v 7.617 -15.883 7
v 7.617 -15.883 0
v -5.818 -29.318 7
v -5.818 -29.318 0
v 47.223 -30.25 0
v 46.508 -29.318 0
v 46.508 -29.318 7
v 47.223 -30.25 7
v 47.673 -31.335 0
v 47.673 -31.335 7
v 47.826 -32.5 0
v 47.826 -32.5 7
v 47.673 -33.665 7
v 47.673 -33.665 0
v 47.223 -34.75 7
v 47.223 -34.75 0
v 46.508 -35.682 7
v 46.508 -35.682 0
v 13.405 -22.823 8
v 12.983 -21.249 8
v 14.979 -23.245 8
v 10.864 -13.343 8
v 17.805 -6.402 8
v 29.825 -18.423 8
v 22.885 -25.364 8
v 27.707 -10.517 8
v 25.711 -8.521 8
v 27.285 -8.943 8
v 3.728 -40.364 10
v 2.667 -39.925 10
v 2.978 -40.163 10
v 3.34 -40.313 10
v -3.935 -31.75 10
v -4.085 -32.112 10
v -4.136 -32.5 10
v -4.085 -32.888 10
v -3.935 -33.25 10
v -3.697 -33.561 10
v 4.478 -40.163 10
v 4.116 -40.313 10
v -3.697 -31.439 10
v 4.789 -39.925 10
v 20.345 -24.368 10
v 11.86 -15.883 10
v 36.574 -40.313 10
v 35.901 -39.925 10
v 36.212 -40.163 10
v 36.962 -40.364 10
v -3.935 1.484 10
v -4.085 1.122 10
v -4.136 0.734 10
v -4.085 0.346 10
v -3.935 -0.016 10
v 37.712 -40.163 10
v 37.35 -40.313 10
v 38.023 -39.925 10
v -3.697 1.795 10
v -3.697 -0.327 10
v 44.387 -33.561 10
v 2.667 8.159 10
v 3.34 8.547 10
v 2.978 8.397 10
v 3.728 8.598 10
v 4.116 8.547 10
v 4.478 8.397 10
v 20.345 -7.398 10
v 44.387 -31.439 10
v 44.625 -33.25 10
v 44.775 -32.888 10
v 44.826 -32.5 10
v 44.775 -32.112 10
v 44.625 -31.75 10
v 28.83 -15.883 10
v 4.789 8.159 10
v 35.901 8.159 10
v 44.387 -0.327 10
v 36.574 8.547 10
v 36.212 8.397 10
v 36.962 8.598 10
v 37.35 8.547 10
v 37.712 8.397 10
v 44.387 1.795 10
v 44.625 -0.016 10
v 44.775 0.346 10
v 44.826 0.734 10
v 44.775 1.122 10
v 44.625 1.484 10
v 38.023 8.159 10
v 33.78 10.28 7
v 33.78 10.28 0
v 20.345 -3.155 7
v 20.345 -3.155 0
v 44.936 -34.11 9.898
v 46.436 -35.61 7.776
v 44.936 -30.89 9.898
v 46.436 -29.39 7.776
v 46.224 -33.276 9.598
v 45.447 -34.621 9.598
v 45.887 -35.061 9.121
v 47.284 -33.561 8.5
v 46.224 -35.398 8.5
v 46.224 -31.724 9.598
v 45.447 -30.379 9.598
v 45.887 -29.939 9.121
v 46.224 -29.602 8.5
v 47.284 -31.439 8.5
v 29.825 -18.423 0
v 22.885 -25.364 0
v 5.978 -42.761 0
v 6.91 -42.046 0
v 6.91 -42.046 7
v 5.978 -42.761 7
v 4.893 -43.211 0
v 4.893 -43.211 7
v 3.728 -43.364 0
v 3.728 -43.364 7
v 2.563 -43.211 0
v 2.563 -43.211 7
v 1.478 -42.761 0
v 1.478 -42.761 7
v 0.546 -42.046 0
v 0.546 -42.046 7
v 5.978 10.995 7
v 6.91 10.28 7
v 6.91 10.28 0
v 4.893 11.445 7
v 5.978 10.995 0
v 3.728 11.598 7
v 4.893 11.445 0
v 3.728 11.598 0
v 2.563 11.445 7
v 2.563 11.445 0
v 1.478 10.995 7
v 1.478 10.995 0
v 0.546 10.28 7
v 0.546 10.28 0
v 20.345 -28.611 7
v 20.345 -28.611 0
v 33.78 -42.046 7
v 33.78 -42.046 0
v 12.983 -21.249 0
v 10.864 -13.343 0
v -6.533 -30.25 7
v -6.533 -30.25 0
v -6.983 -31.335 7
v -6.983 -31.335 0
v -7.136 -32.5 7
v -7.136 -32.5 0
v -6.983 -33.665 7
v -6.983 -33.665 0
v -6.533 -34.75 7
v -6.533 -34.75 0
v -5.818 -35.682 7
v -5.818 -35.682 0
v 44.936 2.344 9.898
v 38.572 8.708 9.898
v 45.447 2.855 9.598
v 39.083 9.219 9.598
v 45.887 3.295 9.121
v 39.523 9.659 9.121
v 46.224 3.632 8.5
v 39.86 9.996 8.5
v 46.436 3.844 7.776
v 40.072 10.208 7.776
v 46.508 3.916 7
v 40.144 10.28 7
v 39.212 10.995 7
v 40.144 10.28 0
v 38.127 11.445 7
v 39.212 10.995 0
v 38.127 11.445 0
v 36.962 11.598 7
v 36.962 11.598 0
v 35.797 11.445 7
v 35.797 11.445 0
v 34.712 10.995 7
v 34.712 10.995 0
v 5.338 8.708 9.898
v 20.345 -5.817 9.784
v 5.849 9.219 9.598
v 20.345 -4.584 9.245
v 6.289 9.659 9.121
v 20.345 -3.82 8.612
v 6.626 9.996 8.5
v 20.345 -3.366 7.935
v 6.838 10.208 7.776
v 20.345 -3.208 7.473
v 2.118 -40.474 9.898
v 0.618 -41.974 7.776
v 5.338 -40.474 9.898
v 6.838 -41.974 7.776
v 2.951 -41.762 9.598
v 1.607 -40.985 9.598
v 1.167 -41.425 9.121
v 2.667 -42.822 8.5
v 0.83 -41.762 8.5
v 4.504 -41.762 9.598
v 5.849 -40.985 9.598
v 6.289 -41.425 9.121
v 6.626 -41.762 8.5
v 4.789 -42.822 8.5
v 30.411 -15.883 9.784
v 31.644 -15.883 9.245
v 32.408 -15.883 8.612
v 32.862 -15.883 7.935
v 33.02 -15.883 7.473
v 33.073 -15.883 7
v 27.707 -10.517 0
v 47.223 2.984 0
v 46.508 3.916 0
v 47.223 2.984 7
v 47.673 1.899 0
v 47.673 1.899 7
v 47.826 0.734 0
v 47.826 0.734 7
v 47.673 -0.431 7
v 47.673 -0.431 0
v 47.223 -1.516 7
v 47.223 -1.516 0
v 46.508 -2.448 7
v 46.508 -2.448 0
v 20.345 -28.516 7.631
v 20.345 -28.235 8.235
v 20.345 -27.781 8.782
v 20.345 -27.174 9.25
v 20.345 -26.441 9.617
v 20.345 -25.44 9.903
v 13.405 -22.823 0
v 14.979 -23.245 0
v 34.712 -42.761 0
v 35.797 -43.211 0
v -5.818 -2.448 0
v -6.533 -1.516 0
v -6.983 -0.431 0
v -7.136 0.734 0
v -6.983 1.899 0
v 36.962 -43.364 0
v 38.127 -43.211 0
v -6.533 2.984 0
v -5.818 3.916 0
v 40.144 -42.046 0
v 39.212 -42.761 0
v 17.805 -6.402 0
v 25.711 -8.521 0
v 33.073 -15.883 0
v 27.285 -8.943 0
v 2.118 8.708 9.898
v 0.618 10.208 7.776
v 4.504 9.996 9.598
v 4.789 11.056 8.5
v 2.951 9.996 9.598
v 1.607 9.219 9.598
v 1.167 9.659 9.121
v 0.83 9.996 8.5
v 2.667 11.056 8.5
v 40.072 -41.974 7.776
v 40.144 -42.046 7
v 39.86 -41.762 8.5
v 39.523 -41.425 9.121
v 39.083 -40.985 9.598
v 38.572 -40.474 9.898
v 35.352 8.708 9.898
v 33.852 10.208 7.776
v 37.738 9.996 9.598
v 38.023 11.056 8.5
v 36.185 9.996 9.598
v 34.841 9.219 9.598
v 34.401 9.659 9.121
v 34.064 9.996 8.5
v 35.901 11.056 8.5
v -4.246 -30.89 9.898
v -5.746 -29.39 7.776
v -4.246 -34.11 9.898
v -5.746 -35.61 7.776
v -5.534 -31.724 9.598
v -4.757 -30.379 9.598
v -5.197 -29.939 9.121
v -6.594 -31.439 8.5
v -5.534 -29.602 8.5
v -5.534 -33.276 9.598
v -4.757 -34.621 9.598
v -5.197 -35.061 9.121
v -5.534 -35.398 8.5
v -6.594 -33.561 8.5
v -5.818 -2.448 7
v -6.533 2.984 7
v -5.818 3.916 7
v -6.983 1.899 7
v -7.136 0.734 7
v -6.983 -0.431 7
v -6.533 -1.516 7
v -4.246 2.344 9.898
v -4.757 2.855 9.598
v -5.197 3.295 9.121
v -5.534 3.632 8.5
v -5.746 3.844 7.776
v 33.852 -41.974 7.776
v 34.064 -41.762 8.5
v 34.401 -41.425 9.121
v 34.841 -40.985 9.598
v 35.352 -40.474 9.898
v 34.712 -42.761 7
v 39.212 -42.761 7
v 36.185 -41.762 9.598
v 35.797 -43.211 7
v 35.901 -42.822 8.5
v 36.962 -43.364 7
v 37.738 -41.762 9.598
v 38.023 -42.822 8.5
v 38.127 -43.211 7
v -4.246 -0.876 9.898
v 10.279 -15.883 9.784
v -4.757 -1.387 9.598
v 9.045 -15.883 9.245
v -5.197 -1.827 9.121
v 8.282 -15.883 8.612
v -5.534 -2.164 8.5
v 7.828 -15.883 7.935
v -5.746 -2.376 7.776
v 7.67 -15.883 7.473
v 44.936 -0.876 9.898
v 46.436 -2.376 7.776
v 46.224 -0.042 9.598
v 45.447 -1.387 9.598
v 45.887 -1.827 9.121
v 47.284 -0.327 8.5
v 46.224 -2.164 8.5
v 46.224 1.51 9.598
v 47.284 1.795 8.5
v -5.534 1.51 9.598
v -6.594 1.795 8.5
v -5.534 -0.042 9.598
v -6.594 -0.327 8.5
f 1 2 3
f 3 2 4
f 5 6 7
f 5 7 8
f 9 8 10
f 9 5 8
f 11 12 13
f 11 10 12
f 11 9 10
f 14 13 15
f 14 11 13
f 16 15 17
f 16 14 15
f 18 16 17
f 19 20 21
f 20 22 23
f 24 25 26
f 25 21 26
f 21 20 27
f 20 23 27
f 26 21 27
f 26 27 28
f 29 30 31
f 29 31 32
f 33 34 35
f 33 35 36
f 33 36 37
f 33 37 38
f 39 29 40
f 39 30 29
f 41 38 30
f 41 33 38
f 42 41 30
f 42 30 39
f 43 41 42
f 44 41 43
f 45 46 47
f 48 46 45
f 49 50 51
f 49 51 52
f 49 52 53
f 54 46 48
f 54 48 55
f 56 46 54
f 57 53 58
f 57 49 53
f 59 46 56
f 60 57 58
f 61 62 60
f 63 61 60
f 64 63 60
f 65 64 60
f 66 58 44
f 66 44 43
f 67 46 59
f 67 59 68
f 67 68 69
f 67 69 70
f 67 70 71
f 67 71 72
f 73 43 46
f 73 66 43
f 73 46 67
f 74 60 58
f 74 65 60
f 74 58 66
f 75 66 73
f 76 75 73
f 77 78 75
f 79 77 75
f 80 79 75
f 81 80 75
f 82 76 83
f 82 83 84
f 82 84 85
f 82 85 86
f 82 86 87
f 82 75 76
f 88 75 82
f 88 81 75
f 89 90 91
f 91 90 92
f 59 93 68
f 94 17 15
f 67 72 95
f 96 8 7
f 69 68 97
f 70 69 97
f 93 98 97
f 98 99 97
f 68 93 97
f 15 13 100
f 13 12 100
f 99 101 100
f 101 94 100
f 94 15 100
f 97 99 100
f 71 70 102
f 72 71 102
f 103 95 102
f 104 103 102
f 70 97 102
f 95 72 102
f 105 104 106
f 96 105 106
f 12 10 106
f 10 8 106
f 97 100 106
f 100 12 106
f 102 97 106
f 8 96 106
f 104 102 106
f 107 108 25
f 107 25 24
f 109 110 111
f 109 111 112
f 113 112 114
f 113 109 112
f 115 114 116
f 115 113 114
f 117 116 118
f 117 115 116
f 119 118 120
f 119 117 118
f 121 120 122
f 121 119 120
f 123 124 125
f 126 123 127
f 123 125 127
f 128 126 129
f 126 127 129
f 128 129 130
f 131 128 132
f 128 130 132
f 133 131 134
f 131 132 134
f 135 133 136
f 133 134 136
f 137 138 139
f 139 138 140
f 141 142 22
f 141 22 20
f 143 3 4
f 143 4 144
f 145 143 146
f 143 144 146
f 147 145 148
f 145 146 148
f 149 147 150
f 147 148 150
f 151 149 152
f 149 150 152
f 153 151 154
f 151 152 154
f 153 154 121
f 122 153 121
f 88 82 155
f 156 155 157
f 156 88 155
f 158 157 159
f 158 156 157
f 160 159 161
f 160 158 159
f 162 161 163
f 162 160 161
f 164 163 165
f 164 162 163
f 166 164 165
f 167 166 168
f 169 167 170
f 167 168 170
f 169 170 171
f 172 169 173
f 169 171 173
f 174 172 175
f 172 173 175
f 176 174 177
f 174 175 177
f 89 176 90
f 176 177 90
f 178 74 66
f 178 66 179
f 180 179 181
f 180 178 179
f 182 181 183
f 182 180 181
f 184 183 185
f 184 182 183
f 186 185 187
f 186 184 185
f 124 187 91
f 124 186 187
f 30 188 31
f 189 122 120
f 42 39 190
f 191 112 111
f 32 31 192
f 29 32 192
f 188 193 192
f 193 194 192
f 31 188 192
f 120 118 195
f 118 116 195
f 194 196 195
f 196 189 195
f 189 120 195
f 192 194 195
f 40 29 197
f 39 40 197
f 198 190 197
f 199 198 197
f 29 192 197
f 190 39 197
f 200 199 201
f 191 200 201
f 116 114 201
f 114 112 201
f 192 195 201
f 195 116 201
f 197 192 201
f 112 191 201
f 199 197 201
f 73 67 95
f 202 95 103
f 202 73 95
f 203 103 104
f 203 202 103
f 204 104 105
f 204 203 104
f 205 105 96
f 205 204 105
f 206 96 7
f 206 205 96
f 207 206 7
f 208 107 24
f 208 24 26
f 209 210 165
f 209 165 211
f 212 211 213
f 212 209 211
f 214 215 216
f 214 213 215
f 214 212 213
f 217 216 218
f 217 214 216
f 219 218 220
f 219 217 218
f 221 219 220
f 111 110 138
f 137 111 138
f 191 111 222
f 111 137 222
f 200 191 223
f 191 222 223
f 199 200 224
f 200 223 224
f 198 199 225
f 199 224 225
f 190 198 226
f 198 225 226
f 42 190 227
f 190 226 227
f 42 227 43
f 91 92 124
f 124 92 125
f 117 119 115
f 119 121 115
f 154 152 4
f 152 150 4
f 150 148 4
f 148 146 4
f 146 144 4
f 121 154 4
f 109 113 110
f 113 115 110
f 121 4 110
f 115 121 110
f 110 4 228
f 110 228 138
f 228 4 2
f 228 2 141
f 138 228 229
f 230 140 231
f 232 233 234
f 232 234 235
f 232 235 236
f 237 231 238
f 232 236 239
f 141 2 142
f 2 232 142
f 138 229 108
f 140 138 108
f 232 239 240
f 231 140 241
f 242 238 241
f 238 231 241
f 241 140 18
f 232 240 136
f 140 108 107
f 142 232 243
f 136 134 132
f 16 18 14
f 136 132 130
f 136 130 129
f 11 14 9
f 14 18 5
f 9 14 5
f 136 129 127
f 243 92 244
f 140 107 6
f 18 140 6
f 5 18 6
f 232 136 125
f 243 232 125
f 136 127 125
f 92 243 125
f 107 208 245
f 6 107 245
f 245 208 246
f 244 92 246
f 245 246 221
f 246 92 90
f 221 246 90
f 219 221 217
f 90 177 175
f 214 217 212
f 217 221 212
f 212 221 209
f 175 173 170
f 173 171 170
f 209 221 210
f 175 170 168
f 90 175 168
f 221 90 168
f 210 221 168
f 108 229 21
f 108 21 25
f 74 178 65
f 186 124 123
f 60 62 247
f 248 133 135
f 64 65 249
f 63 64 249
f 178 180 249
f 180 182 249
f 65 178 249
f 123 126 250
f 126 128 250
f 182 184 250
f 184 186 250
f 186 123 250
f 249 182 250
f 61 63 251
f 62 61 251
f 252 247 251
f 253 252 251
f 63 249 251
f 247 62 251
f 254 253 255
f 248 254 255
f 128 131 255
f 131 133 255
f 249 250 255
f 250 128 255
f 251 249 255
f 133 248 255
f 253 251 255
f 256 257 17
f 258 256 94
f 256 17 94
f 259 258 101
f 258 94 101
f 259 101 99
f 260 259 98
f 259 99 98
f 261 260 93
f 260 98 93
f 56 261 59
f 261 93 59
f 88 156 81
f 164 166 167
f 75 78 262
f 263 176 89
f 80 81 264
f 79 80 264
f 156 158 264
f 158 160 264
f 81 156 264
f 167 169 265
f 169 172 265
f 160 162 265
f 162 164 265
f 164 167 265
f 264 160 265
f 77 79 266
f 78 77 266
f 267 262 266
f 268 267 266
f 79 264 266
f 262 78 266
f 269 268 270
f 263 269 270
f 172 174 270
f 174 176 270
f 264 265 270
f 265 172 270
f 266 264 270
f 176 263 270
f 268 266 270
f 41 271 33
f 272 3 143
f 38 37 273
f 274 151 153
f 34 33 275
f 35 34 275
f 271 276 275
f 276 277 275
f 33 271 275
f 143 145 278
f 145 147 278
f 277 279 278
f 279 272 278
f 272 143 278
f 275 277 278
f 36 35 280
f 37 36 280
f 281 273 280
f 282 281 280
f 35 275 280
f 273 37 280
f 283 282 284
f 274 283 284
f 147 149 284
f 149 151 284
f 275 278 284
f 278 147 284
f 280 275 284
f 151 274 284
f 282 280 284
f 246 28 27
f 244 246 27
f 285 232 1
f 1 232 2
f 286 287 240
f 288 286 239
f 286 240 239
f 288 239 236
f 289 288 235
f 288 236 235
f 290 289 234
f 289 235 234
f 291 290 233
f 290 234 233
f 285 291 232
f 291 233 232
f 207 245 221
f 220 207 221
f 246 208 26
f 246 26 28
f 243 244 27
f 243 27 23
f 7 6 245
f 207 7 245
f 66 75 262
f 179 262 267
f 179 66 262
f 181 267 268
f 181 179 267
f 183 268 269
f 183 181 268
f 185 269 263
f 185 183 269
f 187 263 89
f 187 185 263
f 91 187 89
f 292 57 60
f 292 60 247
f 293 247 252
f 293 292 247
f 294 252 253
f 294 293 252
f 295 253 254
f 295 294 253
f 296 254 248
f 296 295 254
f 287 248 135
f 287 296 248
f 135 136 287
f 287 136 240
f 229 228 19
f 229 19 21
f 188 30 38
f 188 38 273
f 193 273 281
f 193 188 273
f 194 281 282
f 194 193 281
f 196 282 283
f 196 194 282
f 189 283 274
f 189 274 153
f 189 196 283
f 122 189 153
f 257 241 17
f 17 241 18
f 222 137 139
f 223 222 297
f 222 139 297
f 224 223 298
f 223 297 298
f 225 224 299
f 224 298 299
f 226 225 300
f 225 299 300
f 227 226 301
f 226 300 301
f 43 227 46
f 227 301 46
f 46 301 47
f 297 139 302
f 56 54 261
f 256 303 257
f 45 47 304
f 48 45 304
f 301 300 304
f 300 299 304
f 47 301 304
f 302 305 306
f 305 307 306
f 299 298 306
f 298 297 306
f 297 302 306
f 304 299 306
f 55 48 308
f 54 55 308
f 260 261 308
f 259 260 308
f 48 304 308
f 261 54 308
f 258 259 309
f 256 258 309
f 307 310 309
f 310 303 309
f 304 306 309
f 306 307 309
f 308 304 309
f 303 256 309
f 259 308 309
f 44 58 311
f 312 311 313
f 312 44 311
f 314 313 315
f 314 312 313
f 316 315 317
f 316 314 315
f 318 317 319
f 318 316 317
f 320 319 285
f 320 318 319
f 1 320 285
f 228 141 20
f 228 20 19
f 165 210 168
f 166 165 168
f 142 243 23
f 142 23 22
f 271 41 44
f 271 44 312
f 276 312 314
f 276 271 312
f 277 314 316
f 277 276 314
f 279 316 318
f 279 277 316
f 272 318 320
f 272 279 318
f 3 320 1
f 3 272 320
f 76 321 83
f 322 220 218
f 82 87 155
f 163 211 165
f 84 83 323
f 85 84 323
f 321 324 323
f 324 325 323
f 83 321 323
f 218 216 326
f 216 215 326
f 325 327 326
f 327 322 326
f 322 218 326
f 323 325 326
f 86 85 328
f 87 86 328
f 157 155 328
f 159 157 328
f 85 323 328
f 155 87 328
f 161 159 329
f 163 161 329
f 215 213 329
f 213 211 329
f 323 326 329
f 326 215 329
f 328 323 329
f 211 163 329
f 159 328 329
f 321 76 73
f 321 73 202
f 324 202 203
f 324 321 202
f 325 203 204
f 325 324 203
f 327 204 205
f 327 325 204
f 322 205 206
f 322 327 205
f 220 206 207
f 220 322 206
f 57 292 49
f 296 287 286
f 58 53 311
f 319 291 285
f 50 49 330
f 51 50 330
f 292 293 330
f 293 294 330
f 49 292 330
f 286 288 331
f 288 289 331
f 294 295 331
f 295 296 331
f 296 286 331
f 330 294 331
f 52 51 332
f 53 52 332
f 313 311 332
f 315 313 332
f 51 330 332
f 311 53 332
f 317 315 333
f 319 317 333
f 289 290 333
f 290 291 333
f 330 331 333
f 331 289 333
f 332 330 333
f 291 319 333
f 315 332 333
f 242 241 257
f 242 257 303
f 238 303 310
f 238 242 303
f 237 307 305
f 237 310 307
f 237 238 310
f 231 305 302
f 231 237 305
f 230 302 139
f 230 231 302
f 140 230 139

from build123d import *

# Parameters (mm, degrees)
F1_DEPTH     = 10
F2_DEPTH     = 8
F3_R         = 3
F4_T1_DEPTH  = 21.25
F4_T4_ANGLE  = 90
F4_T6_ANGLE  = 90
F4_T8_ANGLE  = 90
F4_T10_ANGLE = 90
F4_T12_ANGLE = 90
F4_T14_ANGLE = 90
F4_T16_ANGLE = 90
F4_T18_ANGLE = 90


# Not quite as in the source:
# - a fillet or chamfer that OpenCascade refuses, or shapes differently, is made with other operations: its cross-section is extruded or revolved along the edge and cut away or added


with BuildPart() as f1:
    # F0 (on Top) → F1 (new body)
    with BuildSketch(Plane.XY):
        Polygon((25.7107810123, -8.5209181738), (27.2851523571, -8.9427697042), (27.7070038876, -10.5171410491), (33.0728534806, -15.8829906421), (49.6898628385, 0.7340187158), (36.9619407771, 13.4619407771), (20.3449314192, -3.1550685808), align=None)
        Polygon((33.0728534806, -15.8829906421), (27.7070038876, -10.5171410491), (29.8254495283, -18.4232878133), (22.8852285904, -25.3635087511), (14.9790818262, -23.2450631104), (20.3449314192, -28.6109127035), align=None)
        Polygon((17.8046342481, -6.4024725331), (25.7107810123, -8.5209181738), (20.3449314192, -3.1550685808), (7.6170093579, -15.8829906421), (12.9828589509, -21.2488402351), (10.8644133102, -13.342693471), align=None)
        Polygon((49.6898628385, -32.5), (33.0728534806, -15.8829906421), (20.3449314192, -28.6109127035), (36.9619407771, -45.2279220614), align=None)
        Polygon((7.6170093579, -15.8829906421), (20.3449314192, -3.1550685808), (3.7279220614, 13.4619407771), (-9, 0.7340187158), align=None)
        Polygon((3.7279220614, -45.2279220614), (20.3449314192, -28.6109127035), (14.9790818262, -23.2450631104), (13.4047104814, -22.82321158), (12.9828589509, -21.2488402351), (7.6170093579, -15.8829906421), (-9, -32.5), align=None)
        Polygon((29.8254495283, -18.4232878133), (27.7070038876, -10.5171410491), (25.7107810123, -8.5209181738), (17.8046342481, -6.4024725331), (10.8644133102, -13.342693471), (12.9828589509, -21.2488402351), (14.9790818262, -23.2450631104), (22.8852285904, -25.3635087511), align=None)
        Polygon((27.7070038876, -10.5171410491), (27.2851523571, -8.9427697042), (25.7107810123, -8.5209181738), align=None)
        Polygon((13.4047104814, -22.82321158), (14.9790818262, -23.2450631104), (12.9828589509, -21.2488402351), align=None)
    extrude(amount=F1_DEPTH)

    # F0 (on Top) → F2 (cut)
    with BuildSketch(Plane.XY):
        Polygon((29.8254495283, -18.4232878133), (27.7070038876, -10.5171410491), (25.7107810123, -8.5209181738), (17.8046342481, -6.4024725331), (10.8644133102, -13.342693471), (12.9828589509, -21.2488402351), (14.9790818262, -23.2450631104), (22.8852285904, -25.3635087511), align=None)
        Polygon((13.4047104814, -22.82321158), (14.9790818262, -23.2450631104), (12.9828589509, -21.2488402351), align=None)
        Polygon((27.7070038876, -10.5171410491), (27.2851523571, -8.9427697042), (25.7107810123, -8.5209181738), align=None)
    extrude(amount=F2_DEPTH, mode=Mode.SUBTRACT)

    # F3
    f3_edges = [f1.edges().sort_by_distance(p)[0] for p in [
        (43.325902, 7.09798, 10),
        (28.653436, 5.153436, 10),
        (12.036427, 5.153436, 10),
        (-2.636039, 7.09798, 10),
        (-0.691495, -7.574486, 10),
        (-0.691495, -24.191495, 10),
        (-2.636039, -38.863961, 10),
        (12.036427, -36.919417, 10),
        (28.653436, -36.919417, 10),
        (43.325902, -38.863961, 10),
        (41.381358, -24.191495, 10),
        (41.381358, -7.574486, 10),
    ]]
    fillet(f3_edges, radius=F3_R)

    # F4: fillet of radius 4.5 on 8 edges, made by hand

    # F4_s2 → F4_t1 (cut)
    with BuildSketch(Plane.XY.offset(-11.25)):
        with BuildLine():
            ThreePointArc((40.1439212925, 10.2799602618), (36.9619407771, 11.5979797464), (33.7799602618, 10.2799602618))
            Line((33.7799602618, 10.2799602618), (36.9619407771, 13.4619407771))
            Line((36.9619407771, 13.4619407771), (40.1439212925, 10.2799602618))
        make_face()
        with BuildLine():
            ThreePointArc((46.5078823231, 3.9159992311), (47.8259018078, 0.7340187158), (46.5078823231, -2.4479617996))
            Line((46.5078823231, -2.4479617996), (49.6898628385, 0.7340187158))
            Line((49.6898628385, 0.7340187158), (46.5078823231, 3.9159992311))
        make_face()
        with BuildLine():
            ThreePointArc((46.5078823231, -29.3180194847), (47.8259018078, -32.5), (46.5078823231, -35.6819805153))
            Line((46.5078823231, -35.6819805153), (49.6898628385, -32.5))
            Line((49.6898628385, -32.5), (46.5078823231, -29.3180194847))
        make_face()
        with BuildLine():
            ThreePointArc((40.1439212925, -42.045941546), (36.9619407771, -43.3639610307), (33.7799602618, -42.045941546))
            Line((33.7799602618, -42.045941546), (36.9619407771, -45.2279220614))
            Line((36.9619407771, -45.2279220614), (40.1439212925, -42.045941546))
        make_face()
        with BuildLine():
            ThreePointArc((6.9099025767, -42.045941546), (3.7279220614, -43.3639610307), (0.545941546, -42.045941546))
            Line((0.545941546, -42.045941546), (3.7279220614, -45.2279220614))
            Line((3.7279220614, -45.2279220614), (6.9099025767, -42.045941546))
        make_face()
        with BuildLine():
            ThreePointArc((-5.8180194847, -29.3180194847), (-7.1360389693, -32.5), (-5.8180194847, -35.6819805153))
            Line((-5.8180194847, -35.6819805153), (-9, -32.5))
            Line((-9, -32.5), (-5.8180194847, -29.3180194847))
        make_face()
        with BuildLine():
            ThreePointArc((-5.8180194847, 3.9159992311), (-7.1360389693, 0.7340187158), (-5.8180194847, -2.4479617996))
            Line((-5.8180194847, -2.4479617996), (-9, 0.7340187158))
            Line((-9, 0.7340187158), (-5.8180194847, 3.9159992311))
        make_face()
        with BuildLine():
            ThreePointArc((6.9099025767, 10.2799602618), (3.7279220614, 11.5979797464), (0.545941546, 10.2799602618))
            Line((0.545941546, 10.2799602618), (3.7279220614, 13.4619407771))
            Line((3.7279220614, 13.4619407771), (6.9099025767, 10.2799602618))
        make_face()
    extrude(amount=F4_T1_DEPTH, mode=Mode.SUBTRACT)

    # F4_s3 → F4_t4 (revolve, cut)
    with BuildSketch(Plane(origin=(-1.6850288425, 1.6850288425, 0), x_dir=(0, 0, 1), z_dir=(0.7071067812, -0.7071067812, 0))):
        with BuildLine():
            ThreePointArc((10, -9.1550685808), (9.1213203436, -11.2763889243), (7, -12.1550685808))
            Line((7, -12.1550685808), (10, -12.1550685808))
            Line((10, -12.1550685808), (10, -9.1550685808))
        make_face()
    revolve(axis=Axis((3.7279220614, 7.0979797464, 10), (0, 0, 1)), revolution_arc=F4_T4_ANGLE, mode=Mode.SUBTRACT)

    # F4_s5 → F4_t6 (revolve, cut)
    with BuildSketch(Plane(origin=(-0.9510101268, -0.9510101268, 0), x_dir=(0, 0, 1), z_dir=(0.7071067812, 0.7071067812, 0))):
        with BuildLine():
            ThreePointArc((10, -3.8829906421), (9.1213203436, -6.0043109857), (7, -6.8829906421))
            Line((7, -6.8829906421), (10, -6.8829906421))
            Line((10, -6.8829906421), (10, -3.8829906421))
        make_face()
    revolve(axis=Axis((-2.6360389693, 0.7340187158, 10), (0, 0, 1)), revolution_arc=F4_T6_ANGLE, mode=Mode.SUBTRACT)

    # F4_s7 → F4_t8 (revolve, cut)
    with BuildSketch(Plane(origin=(-17.5680194847, -17.5680194847, 0), x_dir=(0, 0, 1), z_dir=(0.7071067812, 0.7071067812, 0))):
        with BuildLine():
            ThreePointArc((10, 19.6170093579), (9.1213203436, 17.4956890143), (7, 16.6170093579))
            Line((7, 16.6170093579), (10, 16.6170093579))
            Line((10, 16.6170093579), (10, 19.6170093579))
        make_face()
    revolve(axis=Axis((-2.6360389693, -32.5, 10), (0, 0, 1)), revolution_arc=F4_T8_ANGLE, mode=Mode.SUBTRACT)

    # F4_s9 → F4_t10 (revolve, cut)
    with BuildSketch(Plane(origin=(21.295941546, -21.295941546, 0), x_dir=(0, 0, 1), z_dir=(-0.7071067812, 0.7071067812, 0))):
        with BuildLine():
            ThreePointArc((10, -26.3449314192), (9.1213203436, -28.4662517628), (7, -29.3449314192))
            Line((7, -29.3449314192), (10, -29.3449314192))
            Line((10, -29.3449314192), (10, -26.3449314192))
        make_face()
    revolve(axis=Axis((3.7279220614, -38.8639610307, 10), (0, 0, 1)), revolution_arc=F4_T10_ANGLE, mode=Mode.SUBTRACT)

    # F4_s11 → F4_t12 (revolve, cut)
    with BuildSketch(Plane(origin=(37.9129509039, -37.9129509039, 0), x_dir=(0, 0, 1), z_dir=(-0.7071067812, 0.7071067812, 0))):
        with BuildLine():
            ThreePointArc((10, -2.8449314192), (9.1213203436, -4.9662517628), (7, -5.8449314192))
            Line((7, -5.8449314192), (10, -5.8449314192))
            Line((10, -5.8449314192), (10, -2.8449314192))
        make_face()
    revolve(axis=Axis((36.9619407771, -38.8639610307, 10), (0, 0, 1)), revolution_arc=F4_T12_ANGLE, mode=Mode.SUBTRACT)

    # F4_s13 → F4_t14 (revolve, cut)
    with BuildSketch(Plane(origin=(5.4129509039, 5.4129509039, 0), x_dir=(0, 0, 1), z_dir=(-0.7071067812, -0.7071067812, 0))):
        with BuildLine():
            ThreePointArc((10, -55.1170093579), (9.1213203436, -57.2383297014), (7, -58.1170093579))
            Line((7, -58.1170093579), (10, -58.1170093579))
            Line((10, -58.1170093579), (10, -55.1170093579))
        make_face()
    revolve(axis=Axis((43.3259018078, -32.5, 10), (0, 0, 1)), revolution_arc=F4_T14_ANGLE, mode=Mode.SUBTRACT)

    # F4_s15 → F4_t16 (revolve, cut)
    with BuildSketch(Plane(origin=(22.0299602618, 22.0299602618, 0), x_dir=(0, 0, 1), z_dir=(-0.7071067812, -0.7071067812, 0))):
        with BuildLine():
            ThreePointArc((10, -31.6170093579), (9.1213203436, -33.7383297014), (7, -34.6170093579))
            Line((7, -34.6170093579), (10, -34.6170093579))
            Line((10, -34.6170093579), (10, -31.6170093579))
        make_face()
    revolve(axis=Axis((43.3259018078, 0.7340187158, 10), (0, 0, 1)), revolution_arc=F4_T16_ANGLE, mode=Mode.SUBTRACT)

    # F4_s17 → F4_t18 (revolve, cut)
    with BuildSketch(Plane(origin=(14.9319805153, -14.9319805153, 0), x_dir=(0, 0, 1), z_dir=(0.7071067812, -0.7071067812, 0))):
        with BuildLine():
            ThreePointArc((10, -32.6550685808), (9.1213203436, -34.7763889243), (7, -35.6550685808))
            Line((7, -35.6550685808), (10, -35.6550685808))
            Line((10, -35.6550685808), (10, -32.6550685808))
        make_face()
    revolve(axis=Axis((36.9619407771, 7.0979797464, 10), (0, 0, 1)), revolution_arc=F4_T18_ANGLE, mode=Mode.SUBTRACT)


solid = f1.part
